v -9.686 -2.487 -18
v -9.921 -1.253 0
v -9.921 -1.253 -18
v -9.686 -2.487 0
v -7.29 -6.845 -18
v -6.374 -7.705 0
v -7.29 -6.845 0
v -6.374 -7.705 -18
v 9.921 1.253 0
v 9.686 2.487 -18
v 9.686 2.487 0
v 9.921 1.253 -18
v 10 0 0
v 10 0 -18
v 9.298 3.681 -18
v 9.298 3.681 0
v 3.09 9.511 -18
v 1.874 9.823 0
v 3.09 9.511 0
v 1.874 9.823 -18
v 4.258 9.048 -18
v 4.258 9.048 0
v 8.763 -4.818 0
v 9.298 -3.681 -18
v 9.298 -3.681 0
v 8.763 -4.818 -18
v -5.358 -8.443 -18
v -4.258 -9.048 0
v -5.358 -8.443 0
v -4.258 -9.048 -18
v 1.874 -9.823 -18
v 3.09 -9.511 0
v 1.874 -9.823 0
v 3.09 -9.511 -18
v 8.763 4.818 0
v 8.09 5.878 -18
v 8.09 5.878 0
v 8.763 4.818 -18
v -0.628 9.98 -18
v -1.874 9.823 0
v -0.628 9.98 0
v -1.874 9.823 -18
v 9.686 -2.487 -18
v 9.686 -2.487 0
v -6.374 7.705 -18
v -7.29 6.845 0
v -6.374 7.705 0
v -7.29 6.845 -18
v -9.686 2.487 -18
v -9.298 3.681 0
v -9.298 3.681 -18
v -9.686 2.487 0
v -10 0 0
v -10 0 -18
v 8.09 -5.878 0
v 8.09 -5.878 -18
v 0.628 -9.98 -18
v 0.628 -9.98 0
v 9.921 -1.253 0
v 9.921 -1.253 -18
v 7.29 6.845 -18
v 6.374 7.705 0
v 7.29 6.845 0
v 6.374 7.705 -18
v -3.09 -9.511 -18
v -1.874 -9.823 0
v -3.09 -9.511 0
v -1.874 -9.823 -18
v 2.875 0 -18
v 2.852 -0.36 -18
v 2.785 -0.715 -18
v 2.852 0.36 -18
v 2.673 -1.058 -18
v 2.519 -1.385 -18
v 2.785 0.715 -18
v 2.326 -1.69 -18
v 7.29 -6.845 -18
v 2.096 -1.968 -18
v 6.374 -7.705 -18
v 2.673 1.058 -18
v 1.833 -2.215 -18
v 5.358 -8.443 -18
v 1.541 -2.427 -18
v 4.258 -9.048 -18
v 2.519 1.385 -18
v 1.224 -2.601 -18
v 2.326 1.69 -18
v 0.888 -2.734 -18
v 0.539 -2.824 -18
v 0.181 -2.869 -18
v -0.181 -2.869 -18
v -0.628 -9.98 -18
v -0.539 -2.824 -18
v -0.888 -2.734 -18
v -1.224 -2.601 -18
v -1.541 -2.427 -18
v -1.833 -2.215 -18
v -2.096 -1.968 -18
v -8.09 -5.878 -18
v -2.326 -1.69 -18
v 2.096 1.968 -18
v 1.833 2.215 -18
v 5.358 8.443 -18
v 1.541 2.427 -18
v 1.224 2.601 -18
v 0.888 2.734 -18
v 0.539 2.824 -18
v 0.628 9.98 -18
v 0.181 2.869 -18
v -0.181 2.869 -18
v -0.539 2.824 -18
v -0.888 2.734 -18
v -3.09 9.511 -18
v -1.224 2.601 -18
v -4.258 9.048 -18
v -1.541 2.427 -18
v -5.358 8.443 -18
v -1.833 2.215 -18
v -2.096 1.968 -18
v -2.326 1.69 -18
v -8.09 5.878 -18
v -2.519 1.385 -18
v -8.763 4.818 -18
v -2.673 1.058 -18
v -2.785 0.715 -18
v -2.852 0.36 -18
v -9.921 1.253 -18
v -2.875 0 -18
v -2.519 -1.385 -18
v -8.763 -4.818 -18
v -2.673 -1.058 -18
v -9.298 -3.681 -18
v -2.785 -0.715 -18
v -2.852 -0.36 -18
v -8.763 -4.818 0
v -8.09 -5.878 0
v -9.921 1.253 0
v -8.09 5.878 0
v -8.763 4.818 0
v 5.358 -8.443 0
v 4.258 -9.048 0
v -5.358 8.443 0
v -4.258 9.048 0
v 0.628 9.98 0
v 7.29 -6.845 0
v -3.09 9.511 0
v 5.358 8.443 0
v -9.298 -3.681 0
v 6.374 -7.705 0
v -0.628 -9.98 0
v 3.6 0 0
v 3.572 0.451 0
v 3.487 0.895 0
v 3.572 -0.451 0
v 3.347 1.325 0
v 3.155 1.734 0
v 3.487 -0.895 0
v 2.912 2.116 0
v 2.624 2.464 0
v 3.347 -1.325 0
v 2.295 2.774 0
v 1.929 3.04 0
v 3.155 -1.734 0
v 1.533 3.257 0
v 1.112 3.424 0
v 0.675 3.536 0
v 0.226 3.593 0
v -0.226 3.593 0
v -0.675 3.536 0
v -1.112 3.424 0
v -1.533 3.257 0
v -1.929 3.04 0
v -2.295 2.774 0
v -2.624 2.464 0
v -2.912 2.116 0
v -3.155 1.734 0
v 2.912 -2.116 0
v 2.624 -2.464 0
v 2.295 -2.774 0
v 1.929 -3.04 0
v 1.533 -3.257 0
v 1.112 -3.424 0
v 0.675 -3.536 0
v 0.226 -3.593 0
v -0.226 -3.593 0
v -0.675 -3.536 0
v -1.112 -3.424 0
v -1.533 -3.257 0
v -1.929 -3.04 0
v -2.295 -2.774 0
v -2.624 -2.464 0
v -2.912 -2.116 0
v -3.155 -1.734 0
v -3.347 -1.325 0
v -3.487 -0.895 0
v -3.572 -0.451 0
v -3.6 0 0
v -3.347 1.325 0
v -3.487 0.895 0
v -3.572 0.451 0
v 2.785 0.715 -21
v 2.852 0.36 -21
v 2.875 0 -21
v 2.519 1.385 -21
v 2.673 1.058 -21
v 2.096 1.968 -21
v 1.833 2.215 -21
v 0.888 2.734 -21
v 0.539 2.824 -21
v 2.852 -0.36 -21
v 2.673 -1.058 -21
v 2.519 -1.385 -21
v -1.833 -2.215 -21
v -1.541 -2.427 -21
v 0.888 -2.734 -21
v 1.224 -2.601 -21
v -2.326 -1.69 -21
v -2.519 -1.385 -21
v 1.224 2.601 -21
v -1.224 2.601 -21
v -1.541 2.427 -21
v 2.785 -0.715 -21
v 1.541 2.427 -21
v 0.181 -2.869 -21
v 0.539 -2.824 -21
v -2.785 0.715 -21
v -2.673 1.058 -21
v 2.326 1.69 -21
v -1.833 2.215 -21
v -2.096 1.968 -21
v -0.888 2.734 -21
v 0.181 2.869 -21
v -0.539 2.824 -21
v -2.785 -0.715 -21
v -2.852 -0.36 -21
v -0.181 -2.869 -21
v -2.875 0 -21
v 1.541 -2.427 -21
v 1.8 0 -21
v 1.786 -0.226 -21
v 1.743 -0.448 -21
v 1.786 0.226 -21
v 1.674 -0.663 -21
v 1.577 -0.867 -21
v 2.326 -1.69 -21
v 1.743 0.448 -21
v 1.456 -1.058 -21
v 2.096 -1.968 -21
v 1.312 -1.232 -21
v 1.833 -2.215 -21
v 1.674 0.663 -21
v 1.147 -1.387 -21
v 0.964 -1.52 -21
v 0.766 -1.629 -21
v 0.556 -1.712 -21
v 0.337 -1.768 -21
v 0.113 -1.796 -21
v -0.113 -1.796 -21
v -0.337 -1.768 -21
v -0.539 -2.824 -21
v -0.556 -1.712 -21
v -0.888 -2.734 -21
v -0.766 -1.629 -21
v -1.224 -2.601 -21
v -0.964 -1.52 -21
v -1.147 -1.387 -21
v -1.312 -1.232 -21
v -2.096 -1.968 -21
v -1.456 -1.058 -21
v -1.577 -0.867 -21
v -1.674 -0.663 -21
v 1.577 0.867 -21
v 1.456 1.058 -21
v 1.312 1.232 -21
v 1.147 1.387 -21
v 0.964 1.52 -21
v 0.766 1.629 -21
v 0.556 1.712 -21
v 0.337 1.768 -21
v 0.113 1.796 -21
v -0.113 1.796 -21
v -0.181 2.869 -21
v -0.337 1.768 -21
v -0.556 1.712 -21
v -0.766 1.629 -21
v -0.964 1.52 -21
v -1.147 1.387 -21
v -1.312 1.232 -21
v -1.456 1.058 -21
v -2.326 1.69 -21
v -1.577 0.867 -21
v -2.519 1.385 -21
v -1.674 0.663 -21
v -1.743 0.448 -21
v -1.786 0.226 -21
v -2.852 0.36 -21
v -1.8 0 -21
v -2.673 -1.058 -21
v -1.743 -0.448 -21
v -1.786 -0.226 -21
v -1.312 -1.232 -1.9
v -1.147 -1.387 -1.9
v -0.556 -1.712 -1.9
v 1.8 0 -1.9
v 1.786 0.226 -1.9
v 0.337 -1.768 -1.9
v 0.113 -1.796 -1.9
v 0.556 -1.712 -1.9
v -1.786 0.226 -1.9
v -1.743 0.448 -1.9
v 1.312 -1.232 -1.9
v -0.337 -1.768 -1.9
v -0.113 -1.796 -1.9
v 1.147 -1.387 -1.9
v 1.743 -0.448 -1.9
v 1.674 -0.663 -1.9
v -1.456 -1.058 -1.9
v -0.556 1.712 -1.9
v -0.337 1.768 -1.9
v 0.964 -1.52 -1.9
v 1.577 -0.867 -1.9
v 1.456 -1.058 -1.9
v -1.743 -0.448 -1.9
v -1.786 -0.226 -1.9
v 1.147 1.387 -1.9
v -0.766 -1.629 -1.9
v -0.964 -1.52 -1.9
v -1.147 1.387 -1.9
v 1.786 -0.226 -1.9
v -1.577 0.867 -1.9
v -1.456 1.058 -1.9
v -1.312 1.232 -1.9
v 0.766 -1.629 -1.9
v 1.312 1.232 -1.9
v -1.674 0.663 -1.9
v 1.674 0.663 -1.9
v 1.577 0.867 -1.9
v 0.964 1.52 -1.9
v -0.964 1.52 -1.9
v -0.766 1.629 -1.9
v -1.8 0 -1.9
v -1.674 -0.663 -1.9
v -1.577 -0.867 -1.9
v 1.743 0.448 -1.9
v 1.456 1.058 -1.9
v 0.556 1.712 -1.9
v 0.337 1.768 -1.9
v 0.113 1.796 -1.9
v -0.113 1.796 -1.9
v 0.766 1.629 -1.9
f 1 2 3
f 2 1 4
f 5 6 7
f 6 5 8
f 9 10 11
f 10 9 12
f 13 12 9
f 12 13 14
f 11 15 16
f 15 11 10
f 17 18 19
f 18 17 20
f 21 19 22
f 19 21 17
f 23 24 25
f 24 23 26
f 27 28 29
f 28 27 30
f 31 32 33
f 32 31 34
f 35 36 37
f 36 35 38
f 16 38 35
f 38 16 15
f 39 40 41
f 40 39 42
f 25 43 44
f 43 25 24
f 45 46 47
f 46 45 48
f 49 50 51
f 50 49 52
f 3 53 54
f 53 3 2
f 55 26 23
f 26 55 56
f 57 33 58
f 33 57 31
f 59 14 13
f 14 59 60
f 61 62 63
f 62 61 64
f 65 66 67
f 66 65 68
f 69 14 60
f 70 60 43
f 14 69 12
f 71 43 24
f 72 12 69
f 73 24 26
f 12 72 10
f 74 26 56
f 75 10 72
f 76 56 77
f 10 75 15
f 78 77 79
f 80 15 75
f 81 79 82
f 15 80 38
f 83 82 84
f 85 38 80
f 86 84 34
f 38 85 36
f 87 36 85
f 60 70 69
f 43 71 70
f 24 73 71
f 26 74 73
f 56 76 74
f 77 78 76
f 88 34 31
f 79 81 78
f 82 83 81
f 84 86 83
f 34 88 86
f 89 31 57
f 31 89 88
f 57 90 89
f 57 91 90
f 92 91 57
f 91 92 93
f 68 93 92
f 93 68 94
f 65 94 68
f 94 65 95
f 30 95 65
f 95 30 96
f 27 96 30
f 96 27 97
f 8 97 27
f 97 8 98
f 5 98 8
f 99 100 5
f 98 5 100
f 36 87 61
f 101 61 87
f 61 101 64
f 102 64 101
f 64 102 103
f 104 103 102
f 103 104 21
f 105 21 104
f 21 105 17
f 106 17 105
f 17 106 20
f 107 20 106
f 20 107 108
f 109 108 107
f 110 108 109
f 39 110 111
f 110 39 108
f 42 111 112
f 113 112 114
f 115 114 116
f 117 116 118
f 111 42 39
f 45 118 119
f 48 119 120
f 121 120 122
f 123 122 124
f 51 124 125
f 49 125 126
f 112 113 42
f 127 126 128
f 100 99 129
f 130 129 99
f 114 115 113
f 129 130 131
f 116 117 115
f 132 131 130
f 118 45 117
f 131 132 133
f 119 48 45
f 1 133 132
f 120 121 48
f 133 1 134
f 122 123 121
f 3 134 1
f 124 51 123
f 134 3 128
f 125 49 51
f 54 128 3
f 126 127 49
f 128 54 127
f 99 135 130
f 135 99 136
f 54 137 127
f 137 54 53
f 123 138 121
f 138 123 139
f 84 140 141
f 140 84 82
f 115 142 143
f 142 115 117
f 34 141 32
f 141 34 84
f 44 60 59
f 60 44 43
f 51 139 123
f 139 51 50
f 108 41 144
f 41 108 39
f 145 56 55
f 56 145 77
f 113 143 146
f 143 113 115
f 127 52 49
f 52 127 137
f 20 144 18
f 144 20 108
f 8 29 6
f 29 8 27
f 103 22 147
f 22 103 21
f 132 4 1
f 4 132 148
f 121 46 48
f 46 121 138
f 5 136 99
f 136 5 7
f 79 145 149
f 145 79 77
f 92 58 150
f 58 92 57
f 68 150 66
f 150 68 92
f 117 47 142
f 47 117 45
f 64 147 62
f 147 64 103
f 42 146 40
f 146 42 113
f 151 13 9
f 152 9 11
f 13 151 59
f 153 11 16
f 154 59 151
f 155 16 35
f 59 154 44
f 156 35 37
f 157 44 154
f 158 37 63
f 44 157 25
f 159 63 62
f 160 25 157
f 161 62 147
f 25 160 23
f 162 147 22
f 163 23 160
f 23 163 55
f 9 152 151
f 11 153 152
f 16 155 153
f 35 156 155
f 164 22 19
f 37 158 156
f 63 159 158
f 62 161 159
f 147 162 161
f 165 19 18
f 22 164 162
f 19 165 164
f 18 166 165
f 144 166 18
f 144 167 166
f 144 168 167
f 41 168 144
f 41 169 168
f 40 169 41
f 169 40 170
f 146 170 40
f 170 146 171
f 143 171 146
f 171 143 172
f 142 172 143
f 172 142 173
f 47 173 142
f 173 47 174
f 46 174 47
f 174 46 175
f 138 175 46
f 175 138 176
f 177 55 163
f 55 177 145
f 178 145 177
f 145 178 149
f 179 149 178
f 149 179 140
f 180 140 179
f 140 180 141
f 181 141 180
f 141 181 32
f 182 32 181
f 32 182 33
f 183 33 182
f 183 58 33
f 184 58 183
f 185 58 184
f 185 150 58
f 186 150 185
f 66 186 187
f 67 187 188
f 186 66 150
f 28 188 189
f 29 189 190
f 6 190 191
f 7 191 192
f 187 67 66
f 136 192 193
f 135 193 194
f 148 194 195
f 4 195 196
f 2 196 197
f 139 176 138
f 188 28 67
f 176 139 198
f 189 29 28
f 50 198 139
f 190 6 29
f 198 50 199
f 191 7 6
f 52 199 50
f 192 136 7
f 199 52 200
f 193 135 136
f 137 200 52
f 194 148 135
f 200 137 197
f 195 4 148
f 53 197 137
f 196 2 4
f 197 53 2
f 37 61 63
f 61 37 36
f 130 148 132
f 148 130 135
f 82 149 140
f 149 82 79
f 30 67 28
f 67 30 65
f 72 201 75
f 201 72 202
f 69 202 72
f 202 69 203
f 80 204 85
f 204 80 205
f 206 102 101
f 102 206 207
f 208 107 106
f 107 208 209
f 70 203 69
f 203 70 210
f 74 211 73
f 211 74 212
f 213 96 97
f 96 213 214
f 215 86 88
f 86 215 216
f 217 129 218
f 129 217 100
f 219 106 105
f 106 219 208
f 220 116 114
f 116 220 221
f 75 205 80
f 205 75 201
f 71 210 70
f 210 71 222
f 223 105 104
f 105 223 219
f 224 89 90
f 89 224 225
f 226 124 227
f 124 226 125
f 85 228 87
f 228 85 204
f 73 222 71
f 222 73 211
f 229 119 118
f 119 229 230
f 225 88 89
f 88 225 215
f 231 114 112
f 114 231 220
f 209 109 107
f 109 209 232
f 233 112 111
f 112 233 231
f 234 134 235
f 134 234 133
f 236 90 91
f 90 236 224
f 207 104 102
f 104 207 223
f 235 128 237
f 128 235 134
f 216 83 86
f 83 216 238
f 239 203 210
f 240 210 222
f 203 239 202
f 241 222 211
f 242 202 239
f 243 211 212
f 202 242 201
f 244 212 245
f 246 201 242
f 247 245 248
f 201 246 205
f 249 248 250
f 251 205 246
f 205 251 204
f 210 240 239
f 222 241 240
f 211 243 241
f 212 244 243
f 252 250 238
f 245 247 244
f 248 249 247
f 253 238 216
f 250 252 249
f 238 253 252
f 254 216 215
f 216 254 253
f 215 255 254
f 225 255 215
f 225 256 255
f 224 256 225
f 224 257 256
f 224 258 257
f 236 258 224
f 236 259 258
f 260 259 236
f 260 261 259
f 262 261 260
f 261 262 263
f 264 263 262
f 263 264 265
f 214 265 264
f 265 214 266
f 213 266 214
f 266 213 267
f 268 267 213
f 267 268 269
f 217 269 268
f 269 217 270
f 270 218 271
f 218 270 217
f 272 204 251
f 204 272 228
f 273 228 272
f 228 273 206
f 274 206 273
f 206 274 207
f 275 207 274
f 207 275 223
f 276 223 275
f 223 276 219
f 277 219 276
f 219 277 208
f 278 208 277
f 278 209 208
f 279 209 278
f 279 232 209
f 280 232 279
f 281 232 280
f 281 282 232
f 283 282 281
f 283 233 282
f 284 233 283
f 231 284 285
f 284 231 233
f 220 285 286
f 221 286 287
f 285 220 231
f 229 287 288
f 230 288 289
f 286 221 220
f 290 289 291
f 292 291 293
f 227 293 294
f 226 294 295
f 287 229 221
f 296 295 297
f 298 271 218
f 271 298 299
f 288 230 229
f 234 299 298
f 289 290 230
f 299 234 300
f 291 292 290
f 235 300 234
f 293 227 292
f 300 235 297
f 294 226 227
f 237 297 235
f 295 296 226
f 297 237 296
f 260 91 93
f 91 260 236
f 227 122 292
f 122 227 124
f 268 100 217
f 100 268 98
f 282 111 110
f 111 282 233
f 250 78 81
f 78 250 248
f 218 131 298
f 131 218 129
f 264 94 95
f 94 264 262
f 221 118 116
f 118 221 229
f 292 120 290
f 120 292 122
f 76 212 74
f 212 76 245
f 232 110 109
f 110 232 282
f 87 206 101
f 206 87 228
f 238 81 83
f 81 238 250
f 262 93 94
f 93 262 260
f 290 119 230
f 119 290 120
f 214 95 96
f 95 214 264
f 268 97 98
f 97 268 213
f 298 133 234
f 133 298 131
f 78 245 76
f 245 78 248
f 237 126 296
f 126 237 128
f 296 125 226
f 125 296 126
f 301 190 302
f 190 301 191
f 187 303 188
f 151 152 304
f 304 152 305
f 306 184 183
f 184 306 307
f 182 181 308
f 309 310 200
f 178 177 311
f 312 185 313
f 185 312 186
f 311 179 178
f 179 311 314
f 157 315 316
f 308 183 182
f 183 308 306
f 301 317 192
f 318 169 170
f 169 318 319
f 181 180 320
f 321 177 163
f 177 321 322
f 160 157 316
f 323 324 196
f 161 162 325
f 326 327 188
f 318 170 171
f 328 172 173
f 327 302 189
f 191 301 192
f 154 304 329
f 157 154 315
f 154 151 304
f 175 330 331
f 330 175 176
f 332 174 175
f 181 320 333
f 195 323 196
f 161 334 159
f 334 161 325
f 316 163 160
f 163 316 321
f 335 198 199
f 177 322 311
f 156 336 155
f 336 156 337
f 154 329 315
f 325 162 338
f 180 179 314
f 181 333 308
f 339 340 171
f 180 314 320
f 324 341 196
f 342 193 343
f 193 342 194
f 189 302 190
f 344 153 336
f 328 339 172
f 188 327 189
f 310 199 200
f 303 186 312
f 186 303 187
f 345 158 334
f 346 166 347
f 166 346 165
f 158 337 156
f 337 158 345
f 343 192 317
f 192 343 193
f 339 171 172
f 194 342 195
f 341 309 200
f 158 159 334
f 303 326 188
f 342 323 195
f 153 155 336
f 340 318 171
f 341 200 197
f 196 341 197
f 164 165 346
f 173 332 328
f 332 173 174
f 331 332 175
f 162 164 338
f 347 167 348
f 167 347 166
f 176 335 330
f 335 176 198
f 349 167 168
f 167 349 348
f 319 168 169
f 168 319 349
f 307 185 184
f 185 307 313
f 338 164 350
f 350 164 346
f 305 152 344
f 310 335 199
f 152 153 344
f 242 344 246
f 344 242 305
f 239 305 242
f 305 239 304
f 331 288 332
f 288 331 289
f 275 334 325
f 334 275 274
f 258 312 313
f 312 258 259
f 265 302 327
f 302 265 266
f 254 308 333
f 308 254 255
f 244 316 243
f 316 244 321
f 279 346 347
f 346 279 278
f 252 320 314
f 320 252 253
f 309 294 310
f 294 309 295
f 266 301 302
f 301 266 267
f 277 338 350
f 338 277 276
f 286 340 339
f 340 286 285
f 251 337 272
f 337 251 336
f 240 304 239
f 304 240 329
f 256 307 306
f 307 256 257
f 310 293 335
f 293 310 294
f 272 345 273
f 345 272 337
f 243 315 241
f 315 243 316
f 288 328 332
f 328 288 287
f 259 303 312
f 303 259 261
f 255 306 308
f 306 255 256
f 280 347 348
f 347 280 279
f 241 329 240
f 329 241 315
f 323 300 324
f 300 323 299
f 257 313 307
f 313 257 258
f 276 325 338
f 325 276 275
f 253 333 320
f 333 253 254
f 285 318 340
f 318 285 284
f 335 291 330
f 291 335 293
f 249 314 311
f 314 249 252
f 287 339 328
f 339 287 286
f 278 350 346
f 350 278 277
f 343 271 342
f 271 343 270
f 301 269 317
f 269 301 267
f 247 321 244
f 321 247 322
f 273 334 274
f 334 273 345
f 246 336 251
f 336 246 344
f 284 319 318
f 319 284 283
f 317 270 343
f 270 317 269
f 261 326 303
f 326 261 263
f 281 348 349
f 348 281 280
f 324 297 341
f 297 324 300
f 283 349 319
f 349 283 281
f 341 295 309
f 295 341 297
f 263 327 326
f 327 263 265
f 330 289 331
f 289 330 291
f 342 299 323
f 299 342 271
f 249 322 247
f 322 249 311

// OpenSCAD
$fn = 50;

difference() {
	union() {
		translate(v = [0, 0, -18.0]) {
			cylinder(h = 18, r = 10.0);
		}
		#translate(v = [0, 0, -21.0]) {
			cylinder(h = 21, r = 2.875);
		}
	}
	union() {
		translate(v = [0, 0, 0]) {
			rotate(a = [0, 0, 0]) {
				difference() {
					union() {
						translate(v = [0, 0, -21.0]) {
							cylinder(h = 21, r = 1.5);
						}
						translate(v = [0, 0, -1.9]) {
							cylinder(h = 1.9, r1 = 1.8, r2 = 3.6);
						}
						translate(v = [0, 0, -21.0]) {
							cylinder(h = 21, r = 1.8);
						}
						translate(v = [0, 0, -21.0]) {
							cylinder(h = 21, r = 1.5);
						}
					}
					union();
				}
			}
		}
	}
}
